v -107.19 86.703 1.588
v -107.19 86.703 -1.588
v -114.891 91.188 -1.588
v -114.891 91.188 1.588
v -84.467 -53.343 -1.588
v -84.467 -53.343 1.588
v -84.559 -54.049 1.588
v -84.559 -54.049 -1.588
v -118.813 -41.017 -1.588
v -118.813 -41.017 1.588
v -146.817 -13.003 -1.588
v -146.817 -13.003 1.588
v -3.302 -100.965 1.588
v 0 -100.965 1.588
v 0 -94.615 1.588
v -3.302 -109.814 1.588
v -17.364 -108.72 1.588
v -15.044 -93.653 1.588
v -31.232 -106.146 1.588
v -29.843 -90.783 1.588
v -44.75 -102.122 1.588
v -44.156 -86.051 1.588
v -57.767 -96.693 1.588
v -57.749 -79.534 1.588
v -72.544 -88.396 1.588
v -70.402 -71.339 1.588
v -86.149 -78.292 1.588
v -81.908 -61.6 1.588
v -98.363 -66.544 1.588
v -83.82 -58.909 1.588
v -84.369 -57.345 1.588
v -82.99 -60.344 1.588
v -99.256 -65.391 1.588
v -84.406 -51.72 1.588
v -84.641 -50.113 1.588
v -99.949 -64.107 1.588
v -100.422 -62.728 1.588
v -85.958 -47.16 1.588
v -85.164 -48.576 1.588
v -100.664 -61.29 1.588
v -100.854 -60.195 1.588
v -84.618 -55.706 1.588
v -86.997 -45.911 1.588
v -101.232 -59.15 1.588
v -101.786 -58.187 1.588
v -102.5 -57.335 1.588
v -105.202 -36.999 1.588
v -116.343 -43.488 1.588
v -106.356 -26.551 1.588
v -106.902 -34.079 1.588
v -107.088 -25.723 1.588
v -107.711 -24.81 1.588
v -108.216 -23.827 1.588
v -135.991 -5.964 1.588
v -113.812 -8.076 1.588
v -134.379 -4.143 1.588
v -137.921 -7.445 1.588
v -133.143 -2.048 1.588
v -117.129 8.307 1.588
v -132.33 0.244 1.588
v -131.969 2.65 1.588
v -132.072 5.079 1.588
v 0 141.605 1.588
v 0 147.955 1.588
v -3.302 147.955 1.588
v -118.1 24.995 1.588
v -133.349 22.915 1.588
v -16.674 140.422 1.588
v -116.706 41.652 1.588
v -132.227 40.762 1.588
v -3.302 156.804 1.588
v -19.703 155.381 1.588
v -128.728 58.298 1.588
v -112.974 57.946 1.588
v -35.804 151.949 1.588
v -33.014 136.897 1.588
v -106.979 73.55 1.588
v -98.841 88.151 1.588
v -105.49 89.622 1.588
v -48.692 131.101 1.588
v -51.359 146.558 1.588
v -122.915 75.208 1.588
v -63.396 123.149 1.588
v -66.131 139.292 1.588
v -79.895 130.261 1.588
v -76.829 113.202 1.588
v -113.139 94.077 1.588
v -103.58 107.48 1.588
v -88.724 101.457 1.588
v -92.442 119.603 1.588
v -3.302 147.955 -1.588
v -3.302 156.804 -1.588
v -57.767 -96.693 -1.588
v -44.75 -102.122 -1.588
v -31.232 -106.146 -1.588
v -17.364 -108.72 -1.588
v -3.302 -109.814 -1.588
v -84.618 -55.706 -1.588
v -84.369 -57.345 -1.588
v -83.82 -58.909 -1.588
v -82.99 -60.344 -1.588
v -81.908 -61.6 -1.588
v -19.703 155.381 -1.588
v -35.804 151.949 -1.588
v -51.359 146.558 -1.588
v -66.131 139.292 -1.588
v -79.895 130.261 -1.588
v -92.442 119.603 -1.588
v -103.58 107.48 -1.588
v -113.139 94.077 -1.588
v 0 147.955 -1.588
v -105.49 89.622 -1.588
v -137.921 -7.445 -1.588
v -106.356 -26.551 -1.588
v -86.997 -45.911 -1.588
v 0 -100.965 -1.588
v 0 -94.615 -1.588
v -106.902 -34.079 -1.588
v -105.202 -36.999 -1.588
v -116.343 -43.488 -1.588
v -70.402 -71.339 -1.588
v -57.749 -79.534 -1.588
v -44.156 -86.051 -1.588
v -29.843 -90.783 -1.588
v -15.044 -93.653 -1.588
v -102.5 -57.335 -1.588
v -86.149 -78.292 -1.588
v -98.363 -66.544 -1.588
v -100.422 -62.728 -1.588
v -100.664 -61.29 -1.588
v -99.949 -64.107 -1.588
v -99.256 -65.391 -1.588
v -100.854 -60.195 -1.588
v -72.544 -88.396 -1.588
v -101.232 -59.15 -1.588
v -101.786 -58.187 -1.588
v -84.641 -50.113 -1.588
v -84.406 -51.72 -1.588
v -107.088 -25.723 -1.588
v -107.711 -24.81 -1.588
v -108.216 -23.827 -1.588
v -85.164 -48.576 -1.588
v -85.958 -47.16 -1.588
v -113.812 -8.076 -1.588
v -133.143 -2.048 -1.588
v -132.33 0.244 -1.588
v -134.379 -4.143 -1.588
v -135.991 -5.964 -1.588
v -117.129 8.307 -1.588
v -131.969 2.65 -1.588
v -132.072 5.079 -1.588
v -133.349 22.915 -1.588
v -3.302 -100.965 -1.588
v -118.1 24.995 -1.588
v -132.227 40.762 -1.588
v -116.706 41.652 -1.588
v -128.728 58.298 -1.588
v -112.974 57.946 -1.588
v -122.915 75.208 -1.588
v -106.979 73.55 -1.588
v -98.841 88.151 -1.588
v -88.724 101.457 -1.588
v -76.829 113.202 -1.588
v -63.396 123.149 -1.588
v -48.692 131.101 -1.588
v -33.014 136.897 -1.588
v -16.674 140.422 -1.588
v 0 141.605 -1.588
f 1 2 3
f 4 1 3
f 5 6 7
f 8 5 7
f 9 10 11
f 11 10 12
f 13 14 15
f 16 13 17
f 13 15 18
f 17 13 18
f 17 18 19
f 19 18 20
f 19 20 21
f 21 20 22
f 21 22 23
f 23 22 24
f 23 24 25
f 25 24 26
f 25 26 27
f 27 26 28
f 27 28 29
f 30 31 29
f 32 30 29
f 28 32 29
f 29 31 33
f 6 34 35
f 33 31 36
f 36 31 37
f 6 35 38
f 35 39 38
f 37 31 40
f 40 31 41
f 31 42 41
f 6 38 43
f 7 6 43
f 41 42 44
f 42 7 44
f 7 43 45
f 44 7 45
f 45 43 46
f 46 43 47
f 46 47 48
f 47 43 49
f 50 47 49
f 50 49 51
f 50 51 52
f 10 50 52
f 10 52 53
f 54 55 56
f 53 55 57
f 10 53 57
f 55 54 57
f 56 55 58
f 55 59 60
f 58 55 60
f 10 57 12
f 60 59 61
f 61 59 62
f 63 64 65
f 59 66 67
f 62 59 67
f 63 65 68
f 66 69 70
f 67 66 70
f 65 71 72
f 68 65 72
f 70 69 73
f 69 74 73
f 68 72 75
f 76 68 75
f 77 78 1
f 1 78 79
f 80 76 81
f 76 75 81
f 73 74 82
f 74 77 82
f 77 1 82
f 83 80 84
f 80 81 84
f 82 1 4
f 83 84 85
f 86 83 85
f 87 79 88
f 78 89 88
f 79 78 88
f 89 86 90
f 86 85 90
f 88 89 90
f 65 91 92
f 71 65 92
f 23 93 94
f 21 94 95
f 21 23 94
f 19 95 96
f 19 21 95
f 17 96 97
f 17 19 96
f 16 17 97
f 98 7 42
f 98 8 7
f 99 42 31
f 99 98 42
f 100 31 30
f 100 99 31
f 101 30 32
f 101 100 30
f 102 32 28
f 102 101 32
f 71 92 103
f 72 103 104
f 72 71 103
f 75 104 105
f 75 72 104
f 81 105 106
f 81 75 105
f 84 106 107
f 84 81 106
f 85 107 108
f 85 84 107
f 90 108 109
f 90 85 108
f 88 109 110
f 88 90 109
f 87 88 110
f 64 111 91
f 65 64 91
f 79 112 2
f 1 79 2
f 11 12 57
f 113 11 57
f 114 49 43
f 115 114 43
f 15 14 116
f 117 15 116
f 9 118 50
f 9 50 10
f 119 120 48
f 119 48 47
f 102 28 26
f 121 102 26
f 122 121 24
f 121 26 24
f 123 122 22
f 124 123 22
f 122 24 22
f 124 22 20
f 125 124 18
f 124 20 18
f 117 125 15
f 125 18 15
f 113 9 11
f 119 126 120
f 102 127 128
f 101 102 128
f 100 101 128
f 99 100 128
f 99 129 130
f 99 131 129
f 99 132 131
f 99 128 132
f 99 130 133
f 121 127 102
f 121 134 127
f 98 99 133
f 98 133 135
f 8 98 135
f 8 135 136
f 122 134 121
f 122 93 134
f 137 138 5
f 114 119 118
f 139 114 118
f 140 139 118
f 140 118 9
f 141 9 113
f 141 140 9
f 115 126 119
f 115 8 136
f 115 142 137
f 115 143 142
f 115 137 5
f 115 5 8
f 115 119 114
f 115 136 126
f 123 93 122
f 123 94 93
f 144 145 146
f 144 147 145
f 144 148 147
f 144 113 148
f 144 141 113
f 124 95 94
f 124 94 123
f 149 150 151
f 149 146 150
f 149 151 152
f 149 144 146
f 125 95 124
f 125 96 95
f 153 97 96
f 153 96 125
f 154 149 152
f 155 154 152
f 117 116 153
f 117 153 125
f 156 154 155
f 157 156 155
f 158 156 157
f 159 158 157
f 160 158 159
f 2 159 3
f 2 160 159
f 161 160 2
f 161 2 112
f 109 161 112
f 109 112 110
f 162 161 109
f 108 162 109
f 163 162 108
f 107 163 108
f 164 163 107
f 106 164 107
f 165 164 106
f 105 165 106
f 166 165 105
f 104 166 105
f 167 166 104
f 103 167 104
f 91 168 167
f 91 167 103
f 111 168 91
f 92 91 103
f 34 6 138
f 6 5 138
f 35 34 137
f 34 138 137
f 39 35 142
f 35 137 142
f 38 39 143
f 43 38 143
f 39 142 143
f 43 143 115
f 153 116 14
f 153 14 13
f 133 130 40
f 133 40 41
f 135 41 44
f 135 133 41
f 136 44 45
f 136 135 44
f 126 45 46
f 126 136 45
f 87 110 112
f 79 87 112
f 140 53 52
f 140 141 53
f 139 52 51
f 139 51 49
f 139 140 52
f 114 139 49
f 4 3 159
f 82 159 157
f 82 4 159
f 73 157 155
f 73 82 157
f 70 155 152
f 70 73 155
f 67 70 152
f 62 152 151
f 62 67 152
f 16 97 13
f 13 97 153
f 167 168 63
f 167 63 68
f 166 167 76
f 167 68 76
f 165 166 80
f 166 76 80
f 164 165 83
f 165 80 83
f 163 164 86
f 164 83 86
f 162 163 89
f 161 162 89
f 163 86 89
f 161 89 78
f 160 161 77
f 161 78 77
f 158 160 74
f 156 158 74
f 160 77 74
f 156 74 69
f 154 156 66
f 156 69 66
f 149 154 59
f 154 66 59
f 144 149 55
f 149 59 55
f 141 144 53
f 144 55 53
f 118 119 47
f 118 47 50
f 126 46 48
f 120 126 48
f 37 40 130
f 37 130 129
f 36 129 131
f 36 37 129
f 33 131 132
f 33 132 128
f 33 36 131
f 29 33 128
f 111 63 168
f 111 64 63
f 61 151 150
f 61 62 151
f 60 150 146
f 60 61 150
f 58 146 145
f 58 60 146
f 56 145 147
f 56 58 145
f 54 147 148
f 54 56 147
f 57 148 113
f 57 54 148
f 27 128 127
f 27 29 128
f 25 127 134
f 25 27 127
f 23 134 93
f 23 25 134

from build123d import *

# Parameters (mm, degrees)
BOSS_EXTRUDE1_DEPTH = 1.5875
CUT_EXTRUDE1_DEPTH  = 3.175
FILLET1_R           = 8.89
SKETCH3_W           = 234.443386257
SKETCH3_H           = 422.563019086
CUT_EXTRUDE2_DEPTH  = 206.876411182
BOSS_EXTRUDE2_DEPTH = 1.5875
FILLET2_R           = 6.35
FILLET3_R           = 12.7
SKETCH6_W           = 3.302
SKETCH6_H           = 12.7
CUT_EXTRUDE3_DEPTH  = 215.861709895


with BuildPart() as part:
    # Sketch1 → Boss-Extrude1 (new, symmetric)
    with BuildSketch(Plane.XY):
        with BuildLine():
            Line((-120.187952283, -34.272453), (-99.98237601, -54.478029272))
            Line((-99.98237601, -54.478029272), (-101.142590553, -63.40953887))
            ThreePointArc((-101.142590553, -63.40953887), (-81.179103762, -82.298079227), (-57.767453, -96.692952283))
            ThreePointArc((-57.767453, -96.692952283), (94.292689271, 117.787689271), (-120.187952283, -34.272453))
        make_face()
    extrude(amount=BOSS_EXTRUDE1_DEPTH, both=True)

    # Sketch2 → Cut-Extrude1 (cut)
    with BuildSketch(Plane.XY.offset(1.5875)):
        with BuildLine():
            Line((-83.903310386, -49.004480206), (-85.12178765, -58.384505172))
            ThreePointArc((-85.12178765, -58.384505172), (97.723123527, 89.828726174), (-107.51910025, -25.388690342))
            Line((-107.51910025, -25.388690342), (-83.903310386, -49.004480206))
        make_face()
    extrude(amount=-CUT_EXTRUDE1_DEPTH, mode=Mode.SUBTRACT)

    # Fillet1
    fillet1_edges = [part.edges().sort_by_distance(p)[0] for p in [
        (-83.903310386, -49.004480206, 0),
        (-107.51910025, -25.388690342, 0),
        (-85.12178765, -58.384505172, 0),
        (-99.98237601, -54.478029272, -0.79375),
        (-120.187952283, -34.272453, -0.79375),
        (-101.142590553, -63.40953887, -0.79375),
    ]]
    fillet(fillet1_edges, radius=FILLET1_R)

    # Sketch3 → Cut-Extrude2 (cut, through all)
    with BuildSketch(Plane(origin=(0, 0, 0), x_dir=(0, 0, -1), z_dir=(1, 0, 0))):
        with Locations((10.168628802, 16.433452221)):
            Rectangle(SKETCH3_W, SKETCH3_H)
    extrude(amount=CUT_EXTRUDE2_DEPTH, mode=Mode.SUBTRACT)

    # Sketch5 → Boss-Extrude2 (add, symmetric)
    with BuildSketch(Plane.XY):
        Polygon((-146.81661939, -13.003405573), (-125.293457687, 0.445758531), (-91.969146245, -50.60762416), (-100.600425128, -59.235866221), align=None)
    extrude(amount=BOSS_EXTRUDE2_DEPTH, both=True)

    # Fillet2
    # the kernel refuses this fillet: 6.35 mm, written as the material it adds along each edge
    with BuildSketch(Plane(origin=(-100.600425128, -59.235866221, -1.5875), x_dir=(-0.03079411224323655, -0.9995257488685076, 0), z_dir=(0, 0, 1)), Plane(origin=(-100.600425128, -59.235866221, 0), x_dir=(-0.03079411224323655, -0.9995257488685076, 0), z_dir=(0, 0, 1))) as fillet2_piece_1:
        with BuildLine():
            CenterArc((2.784435169, -6.30796831), FILLET2_R, 96.595975588, 40.158594829)
            Line((-1.841067542, -1.957425279), (-2.303617813, -1.522370976))
            Line((-2.303617813, -1.522370976), (-0.462550271, 0.435054303))
            Line((-0.462550271, 0.435054303), (0.062369909, 0.63192958))
            ThreePointArc((0.062369909, 0.63192958), (0.223047541, 0.61607109), (1.982086545, 0.630796831))
            Line((1.982086545, 0.630796831), (2.055027329, 0))
        make_face()
    extrude(amount=1.5875)

    # Fillet3
    fillet3_edges = [part.edges().sort_by_distance(p)[0] for p in [
        (-130.70446004, -2.935411002, 0),
    ]]
    fillet(fillet3_edges, radius=FILLET3_R)

    # Sketch6 → Cut-Extrude3 (cut, through all)
    with BuildSketch(Plane(origin=(0, 0, -1.5875), x_dir=(-1, 0, 0), z_dir=(0, 0, -1))):
        with Locations((1.651, 154.305)):
            Rectangle(SKETCH6_W, SKETCH6_H)
        Polygon((105.489605782, 89.621888205), (107.18979641, 86.702712453), (118.164141341, 93.094406542), (116.463950713, 96.013582294), align=None)
        Polygon((105.201667309, -36.998635355), (106.90185793, -34.079459599), (128.850547824, -46.862847722), (127.150357204, -49.782023478), align=None)
        with Locations((1.651, -107.315)):
            Rectangle(SKETCH6_W, SKETCH6_H)
    extrude(amount=-CUT_EXTRUDE3_DEPTH, mode=Mode.SUBTRACT)


solid = part.part
